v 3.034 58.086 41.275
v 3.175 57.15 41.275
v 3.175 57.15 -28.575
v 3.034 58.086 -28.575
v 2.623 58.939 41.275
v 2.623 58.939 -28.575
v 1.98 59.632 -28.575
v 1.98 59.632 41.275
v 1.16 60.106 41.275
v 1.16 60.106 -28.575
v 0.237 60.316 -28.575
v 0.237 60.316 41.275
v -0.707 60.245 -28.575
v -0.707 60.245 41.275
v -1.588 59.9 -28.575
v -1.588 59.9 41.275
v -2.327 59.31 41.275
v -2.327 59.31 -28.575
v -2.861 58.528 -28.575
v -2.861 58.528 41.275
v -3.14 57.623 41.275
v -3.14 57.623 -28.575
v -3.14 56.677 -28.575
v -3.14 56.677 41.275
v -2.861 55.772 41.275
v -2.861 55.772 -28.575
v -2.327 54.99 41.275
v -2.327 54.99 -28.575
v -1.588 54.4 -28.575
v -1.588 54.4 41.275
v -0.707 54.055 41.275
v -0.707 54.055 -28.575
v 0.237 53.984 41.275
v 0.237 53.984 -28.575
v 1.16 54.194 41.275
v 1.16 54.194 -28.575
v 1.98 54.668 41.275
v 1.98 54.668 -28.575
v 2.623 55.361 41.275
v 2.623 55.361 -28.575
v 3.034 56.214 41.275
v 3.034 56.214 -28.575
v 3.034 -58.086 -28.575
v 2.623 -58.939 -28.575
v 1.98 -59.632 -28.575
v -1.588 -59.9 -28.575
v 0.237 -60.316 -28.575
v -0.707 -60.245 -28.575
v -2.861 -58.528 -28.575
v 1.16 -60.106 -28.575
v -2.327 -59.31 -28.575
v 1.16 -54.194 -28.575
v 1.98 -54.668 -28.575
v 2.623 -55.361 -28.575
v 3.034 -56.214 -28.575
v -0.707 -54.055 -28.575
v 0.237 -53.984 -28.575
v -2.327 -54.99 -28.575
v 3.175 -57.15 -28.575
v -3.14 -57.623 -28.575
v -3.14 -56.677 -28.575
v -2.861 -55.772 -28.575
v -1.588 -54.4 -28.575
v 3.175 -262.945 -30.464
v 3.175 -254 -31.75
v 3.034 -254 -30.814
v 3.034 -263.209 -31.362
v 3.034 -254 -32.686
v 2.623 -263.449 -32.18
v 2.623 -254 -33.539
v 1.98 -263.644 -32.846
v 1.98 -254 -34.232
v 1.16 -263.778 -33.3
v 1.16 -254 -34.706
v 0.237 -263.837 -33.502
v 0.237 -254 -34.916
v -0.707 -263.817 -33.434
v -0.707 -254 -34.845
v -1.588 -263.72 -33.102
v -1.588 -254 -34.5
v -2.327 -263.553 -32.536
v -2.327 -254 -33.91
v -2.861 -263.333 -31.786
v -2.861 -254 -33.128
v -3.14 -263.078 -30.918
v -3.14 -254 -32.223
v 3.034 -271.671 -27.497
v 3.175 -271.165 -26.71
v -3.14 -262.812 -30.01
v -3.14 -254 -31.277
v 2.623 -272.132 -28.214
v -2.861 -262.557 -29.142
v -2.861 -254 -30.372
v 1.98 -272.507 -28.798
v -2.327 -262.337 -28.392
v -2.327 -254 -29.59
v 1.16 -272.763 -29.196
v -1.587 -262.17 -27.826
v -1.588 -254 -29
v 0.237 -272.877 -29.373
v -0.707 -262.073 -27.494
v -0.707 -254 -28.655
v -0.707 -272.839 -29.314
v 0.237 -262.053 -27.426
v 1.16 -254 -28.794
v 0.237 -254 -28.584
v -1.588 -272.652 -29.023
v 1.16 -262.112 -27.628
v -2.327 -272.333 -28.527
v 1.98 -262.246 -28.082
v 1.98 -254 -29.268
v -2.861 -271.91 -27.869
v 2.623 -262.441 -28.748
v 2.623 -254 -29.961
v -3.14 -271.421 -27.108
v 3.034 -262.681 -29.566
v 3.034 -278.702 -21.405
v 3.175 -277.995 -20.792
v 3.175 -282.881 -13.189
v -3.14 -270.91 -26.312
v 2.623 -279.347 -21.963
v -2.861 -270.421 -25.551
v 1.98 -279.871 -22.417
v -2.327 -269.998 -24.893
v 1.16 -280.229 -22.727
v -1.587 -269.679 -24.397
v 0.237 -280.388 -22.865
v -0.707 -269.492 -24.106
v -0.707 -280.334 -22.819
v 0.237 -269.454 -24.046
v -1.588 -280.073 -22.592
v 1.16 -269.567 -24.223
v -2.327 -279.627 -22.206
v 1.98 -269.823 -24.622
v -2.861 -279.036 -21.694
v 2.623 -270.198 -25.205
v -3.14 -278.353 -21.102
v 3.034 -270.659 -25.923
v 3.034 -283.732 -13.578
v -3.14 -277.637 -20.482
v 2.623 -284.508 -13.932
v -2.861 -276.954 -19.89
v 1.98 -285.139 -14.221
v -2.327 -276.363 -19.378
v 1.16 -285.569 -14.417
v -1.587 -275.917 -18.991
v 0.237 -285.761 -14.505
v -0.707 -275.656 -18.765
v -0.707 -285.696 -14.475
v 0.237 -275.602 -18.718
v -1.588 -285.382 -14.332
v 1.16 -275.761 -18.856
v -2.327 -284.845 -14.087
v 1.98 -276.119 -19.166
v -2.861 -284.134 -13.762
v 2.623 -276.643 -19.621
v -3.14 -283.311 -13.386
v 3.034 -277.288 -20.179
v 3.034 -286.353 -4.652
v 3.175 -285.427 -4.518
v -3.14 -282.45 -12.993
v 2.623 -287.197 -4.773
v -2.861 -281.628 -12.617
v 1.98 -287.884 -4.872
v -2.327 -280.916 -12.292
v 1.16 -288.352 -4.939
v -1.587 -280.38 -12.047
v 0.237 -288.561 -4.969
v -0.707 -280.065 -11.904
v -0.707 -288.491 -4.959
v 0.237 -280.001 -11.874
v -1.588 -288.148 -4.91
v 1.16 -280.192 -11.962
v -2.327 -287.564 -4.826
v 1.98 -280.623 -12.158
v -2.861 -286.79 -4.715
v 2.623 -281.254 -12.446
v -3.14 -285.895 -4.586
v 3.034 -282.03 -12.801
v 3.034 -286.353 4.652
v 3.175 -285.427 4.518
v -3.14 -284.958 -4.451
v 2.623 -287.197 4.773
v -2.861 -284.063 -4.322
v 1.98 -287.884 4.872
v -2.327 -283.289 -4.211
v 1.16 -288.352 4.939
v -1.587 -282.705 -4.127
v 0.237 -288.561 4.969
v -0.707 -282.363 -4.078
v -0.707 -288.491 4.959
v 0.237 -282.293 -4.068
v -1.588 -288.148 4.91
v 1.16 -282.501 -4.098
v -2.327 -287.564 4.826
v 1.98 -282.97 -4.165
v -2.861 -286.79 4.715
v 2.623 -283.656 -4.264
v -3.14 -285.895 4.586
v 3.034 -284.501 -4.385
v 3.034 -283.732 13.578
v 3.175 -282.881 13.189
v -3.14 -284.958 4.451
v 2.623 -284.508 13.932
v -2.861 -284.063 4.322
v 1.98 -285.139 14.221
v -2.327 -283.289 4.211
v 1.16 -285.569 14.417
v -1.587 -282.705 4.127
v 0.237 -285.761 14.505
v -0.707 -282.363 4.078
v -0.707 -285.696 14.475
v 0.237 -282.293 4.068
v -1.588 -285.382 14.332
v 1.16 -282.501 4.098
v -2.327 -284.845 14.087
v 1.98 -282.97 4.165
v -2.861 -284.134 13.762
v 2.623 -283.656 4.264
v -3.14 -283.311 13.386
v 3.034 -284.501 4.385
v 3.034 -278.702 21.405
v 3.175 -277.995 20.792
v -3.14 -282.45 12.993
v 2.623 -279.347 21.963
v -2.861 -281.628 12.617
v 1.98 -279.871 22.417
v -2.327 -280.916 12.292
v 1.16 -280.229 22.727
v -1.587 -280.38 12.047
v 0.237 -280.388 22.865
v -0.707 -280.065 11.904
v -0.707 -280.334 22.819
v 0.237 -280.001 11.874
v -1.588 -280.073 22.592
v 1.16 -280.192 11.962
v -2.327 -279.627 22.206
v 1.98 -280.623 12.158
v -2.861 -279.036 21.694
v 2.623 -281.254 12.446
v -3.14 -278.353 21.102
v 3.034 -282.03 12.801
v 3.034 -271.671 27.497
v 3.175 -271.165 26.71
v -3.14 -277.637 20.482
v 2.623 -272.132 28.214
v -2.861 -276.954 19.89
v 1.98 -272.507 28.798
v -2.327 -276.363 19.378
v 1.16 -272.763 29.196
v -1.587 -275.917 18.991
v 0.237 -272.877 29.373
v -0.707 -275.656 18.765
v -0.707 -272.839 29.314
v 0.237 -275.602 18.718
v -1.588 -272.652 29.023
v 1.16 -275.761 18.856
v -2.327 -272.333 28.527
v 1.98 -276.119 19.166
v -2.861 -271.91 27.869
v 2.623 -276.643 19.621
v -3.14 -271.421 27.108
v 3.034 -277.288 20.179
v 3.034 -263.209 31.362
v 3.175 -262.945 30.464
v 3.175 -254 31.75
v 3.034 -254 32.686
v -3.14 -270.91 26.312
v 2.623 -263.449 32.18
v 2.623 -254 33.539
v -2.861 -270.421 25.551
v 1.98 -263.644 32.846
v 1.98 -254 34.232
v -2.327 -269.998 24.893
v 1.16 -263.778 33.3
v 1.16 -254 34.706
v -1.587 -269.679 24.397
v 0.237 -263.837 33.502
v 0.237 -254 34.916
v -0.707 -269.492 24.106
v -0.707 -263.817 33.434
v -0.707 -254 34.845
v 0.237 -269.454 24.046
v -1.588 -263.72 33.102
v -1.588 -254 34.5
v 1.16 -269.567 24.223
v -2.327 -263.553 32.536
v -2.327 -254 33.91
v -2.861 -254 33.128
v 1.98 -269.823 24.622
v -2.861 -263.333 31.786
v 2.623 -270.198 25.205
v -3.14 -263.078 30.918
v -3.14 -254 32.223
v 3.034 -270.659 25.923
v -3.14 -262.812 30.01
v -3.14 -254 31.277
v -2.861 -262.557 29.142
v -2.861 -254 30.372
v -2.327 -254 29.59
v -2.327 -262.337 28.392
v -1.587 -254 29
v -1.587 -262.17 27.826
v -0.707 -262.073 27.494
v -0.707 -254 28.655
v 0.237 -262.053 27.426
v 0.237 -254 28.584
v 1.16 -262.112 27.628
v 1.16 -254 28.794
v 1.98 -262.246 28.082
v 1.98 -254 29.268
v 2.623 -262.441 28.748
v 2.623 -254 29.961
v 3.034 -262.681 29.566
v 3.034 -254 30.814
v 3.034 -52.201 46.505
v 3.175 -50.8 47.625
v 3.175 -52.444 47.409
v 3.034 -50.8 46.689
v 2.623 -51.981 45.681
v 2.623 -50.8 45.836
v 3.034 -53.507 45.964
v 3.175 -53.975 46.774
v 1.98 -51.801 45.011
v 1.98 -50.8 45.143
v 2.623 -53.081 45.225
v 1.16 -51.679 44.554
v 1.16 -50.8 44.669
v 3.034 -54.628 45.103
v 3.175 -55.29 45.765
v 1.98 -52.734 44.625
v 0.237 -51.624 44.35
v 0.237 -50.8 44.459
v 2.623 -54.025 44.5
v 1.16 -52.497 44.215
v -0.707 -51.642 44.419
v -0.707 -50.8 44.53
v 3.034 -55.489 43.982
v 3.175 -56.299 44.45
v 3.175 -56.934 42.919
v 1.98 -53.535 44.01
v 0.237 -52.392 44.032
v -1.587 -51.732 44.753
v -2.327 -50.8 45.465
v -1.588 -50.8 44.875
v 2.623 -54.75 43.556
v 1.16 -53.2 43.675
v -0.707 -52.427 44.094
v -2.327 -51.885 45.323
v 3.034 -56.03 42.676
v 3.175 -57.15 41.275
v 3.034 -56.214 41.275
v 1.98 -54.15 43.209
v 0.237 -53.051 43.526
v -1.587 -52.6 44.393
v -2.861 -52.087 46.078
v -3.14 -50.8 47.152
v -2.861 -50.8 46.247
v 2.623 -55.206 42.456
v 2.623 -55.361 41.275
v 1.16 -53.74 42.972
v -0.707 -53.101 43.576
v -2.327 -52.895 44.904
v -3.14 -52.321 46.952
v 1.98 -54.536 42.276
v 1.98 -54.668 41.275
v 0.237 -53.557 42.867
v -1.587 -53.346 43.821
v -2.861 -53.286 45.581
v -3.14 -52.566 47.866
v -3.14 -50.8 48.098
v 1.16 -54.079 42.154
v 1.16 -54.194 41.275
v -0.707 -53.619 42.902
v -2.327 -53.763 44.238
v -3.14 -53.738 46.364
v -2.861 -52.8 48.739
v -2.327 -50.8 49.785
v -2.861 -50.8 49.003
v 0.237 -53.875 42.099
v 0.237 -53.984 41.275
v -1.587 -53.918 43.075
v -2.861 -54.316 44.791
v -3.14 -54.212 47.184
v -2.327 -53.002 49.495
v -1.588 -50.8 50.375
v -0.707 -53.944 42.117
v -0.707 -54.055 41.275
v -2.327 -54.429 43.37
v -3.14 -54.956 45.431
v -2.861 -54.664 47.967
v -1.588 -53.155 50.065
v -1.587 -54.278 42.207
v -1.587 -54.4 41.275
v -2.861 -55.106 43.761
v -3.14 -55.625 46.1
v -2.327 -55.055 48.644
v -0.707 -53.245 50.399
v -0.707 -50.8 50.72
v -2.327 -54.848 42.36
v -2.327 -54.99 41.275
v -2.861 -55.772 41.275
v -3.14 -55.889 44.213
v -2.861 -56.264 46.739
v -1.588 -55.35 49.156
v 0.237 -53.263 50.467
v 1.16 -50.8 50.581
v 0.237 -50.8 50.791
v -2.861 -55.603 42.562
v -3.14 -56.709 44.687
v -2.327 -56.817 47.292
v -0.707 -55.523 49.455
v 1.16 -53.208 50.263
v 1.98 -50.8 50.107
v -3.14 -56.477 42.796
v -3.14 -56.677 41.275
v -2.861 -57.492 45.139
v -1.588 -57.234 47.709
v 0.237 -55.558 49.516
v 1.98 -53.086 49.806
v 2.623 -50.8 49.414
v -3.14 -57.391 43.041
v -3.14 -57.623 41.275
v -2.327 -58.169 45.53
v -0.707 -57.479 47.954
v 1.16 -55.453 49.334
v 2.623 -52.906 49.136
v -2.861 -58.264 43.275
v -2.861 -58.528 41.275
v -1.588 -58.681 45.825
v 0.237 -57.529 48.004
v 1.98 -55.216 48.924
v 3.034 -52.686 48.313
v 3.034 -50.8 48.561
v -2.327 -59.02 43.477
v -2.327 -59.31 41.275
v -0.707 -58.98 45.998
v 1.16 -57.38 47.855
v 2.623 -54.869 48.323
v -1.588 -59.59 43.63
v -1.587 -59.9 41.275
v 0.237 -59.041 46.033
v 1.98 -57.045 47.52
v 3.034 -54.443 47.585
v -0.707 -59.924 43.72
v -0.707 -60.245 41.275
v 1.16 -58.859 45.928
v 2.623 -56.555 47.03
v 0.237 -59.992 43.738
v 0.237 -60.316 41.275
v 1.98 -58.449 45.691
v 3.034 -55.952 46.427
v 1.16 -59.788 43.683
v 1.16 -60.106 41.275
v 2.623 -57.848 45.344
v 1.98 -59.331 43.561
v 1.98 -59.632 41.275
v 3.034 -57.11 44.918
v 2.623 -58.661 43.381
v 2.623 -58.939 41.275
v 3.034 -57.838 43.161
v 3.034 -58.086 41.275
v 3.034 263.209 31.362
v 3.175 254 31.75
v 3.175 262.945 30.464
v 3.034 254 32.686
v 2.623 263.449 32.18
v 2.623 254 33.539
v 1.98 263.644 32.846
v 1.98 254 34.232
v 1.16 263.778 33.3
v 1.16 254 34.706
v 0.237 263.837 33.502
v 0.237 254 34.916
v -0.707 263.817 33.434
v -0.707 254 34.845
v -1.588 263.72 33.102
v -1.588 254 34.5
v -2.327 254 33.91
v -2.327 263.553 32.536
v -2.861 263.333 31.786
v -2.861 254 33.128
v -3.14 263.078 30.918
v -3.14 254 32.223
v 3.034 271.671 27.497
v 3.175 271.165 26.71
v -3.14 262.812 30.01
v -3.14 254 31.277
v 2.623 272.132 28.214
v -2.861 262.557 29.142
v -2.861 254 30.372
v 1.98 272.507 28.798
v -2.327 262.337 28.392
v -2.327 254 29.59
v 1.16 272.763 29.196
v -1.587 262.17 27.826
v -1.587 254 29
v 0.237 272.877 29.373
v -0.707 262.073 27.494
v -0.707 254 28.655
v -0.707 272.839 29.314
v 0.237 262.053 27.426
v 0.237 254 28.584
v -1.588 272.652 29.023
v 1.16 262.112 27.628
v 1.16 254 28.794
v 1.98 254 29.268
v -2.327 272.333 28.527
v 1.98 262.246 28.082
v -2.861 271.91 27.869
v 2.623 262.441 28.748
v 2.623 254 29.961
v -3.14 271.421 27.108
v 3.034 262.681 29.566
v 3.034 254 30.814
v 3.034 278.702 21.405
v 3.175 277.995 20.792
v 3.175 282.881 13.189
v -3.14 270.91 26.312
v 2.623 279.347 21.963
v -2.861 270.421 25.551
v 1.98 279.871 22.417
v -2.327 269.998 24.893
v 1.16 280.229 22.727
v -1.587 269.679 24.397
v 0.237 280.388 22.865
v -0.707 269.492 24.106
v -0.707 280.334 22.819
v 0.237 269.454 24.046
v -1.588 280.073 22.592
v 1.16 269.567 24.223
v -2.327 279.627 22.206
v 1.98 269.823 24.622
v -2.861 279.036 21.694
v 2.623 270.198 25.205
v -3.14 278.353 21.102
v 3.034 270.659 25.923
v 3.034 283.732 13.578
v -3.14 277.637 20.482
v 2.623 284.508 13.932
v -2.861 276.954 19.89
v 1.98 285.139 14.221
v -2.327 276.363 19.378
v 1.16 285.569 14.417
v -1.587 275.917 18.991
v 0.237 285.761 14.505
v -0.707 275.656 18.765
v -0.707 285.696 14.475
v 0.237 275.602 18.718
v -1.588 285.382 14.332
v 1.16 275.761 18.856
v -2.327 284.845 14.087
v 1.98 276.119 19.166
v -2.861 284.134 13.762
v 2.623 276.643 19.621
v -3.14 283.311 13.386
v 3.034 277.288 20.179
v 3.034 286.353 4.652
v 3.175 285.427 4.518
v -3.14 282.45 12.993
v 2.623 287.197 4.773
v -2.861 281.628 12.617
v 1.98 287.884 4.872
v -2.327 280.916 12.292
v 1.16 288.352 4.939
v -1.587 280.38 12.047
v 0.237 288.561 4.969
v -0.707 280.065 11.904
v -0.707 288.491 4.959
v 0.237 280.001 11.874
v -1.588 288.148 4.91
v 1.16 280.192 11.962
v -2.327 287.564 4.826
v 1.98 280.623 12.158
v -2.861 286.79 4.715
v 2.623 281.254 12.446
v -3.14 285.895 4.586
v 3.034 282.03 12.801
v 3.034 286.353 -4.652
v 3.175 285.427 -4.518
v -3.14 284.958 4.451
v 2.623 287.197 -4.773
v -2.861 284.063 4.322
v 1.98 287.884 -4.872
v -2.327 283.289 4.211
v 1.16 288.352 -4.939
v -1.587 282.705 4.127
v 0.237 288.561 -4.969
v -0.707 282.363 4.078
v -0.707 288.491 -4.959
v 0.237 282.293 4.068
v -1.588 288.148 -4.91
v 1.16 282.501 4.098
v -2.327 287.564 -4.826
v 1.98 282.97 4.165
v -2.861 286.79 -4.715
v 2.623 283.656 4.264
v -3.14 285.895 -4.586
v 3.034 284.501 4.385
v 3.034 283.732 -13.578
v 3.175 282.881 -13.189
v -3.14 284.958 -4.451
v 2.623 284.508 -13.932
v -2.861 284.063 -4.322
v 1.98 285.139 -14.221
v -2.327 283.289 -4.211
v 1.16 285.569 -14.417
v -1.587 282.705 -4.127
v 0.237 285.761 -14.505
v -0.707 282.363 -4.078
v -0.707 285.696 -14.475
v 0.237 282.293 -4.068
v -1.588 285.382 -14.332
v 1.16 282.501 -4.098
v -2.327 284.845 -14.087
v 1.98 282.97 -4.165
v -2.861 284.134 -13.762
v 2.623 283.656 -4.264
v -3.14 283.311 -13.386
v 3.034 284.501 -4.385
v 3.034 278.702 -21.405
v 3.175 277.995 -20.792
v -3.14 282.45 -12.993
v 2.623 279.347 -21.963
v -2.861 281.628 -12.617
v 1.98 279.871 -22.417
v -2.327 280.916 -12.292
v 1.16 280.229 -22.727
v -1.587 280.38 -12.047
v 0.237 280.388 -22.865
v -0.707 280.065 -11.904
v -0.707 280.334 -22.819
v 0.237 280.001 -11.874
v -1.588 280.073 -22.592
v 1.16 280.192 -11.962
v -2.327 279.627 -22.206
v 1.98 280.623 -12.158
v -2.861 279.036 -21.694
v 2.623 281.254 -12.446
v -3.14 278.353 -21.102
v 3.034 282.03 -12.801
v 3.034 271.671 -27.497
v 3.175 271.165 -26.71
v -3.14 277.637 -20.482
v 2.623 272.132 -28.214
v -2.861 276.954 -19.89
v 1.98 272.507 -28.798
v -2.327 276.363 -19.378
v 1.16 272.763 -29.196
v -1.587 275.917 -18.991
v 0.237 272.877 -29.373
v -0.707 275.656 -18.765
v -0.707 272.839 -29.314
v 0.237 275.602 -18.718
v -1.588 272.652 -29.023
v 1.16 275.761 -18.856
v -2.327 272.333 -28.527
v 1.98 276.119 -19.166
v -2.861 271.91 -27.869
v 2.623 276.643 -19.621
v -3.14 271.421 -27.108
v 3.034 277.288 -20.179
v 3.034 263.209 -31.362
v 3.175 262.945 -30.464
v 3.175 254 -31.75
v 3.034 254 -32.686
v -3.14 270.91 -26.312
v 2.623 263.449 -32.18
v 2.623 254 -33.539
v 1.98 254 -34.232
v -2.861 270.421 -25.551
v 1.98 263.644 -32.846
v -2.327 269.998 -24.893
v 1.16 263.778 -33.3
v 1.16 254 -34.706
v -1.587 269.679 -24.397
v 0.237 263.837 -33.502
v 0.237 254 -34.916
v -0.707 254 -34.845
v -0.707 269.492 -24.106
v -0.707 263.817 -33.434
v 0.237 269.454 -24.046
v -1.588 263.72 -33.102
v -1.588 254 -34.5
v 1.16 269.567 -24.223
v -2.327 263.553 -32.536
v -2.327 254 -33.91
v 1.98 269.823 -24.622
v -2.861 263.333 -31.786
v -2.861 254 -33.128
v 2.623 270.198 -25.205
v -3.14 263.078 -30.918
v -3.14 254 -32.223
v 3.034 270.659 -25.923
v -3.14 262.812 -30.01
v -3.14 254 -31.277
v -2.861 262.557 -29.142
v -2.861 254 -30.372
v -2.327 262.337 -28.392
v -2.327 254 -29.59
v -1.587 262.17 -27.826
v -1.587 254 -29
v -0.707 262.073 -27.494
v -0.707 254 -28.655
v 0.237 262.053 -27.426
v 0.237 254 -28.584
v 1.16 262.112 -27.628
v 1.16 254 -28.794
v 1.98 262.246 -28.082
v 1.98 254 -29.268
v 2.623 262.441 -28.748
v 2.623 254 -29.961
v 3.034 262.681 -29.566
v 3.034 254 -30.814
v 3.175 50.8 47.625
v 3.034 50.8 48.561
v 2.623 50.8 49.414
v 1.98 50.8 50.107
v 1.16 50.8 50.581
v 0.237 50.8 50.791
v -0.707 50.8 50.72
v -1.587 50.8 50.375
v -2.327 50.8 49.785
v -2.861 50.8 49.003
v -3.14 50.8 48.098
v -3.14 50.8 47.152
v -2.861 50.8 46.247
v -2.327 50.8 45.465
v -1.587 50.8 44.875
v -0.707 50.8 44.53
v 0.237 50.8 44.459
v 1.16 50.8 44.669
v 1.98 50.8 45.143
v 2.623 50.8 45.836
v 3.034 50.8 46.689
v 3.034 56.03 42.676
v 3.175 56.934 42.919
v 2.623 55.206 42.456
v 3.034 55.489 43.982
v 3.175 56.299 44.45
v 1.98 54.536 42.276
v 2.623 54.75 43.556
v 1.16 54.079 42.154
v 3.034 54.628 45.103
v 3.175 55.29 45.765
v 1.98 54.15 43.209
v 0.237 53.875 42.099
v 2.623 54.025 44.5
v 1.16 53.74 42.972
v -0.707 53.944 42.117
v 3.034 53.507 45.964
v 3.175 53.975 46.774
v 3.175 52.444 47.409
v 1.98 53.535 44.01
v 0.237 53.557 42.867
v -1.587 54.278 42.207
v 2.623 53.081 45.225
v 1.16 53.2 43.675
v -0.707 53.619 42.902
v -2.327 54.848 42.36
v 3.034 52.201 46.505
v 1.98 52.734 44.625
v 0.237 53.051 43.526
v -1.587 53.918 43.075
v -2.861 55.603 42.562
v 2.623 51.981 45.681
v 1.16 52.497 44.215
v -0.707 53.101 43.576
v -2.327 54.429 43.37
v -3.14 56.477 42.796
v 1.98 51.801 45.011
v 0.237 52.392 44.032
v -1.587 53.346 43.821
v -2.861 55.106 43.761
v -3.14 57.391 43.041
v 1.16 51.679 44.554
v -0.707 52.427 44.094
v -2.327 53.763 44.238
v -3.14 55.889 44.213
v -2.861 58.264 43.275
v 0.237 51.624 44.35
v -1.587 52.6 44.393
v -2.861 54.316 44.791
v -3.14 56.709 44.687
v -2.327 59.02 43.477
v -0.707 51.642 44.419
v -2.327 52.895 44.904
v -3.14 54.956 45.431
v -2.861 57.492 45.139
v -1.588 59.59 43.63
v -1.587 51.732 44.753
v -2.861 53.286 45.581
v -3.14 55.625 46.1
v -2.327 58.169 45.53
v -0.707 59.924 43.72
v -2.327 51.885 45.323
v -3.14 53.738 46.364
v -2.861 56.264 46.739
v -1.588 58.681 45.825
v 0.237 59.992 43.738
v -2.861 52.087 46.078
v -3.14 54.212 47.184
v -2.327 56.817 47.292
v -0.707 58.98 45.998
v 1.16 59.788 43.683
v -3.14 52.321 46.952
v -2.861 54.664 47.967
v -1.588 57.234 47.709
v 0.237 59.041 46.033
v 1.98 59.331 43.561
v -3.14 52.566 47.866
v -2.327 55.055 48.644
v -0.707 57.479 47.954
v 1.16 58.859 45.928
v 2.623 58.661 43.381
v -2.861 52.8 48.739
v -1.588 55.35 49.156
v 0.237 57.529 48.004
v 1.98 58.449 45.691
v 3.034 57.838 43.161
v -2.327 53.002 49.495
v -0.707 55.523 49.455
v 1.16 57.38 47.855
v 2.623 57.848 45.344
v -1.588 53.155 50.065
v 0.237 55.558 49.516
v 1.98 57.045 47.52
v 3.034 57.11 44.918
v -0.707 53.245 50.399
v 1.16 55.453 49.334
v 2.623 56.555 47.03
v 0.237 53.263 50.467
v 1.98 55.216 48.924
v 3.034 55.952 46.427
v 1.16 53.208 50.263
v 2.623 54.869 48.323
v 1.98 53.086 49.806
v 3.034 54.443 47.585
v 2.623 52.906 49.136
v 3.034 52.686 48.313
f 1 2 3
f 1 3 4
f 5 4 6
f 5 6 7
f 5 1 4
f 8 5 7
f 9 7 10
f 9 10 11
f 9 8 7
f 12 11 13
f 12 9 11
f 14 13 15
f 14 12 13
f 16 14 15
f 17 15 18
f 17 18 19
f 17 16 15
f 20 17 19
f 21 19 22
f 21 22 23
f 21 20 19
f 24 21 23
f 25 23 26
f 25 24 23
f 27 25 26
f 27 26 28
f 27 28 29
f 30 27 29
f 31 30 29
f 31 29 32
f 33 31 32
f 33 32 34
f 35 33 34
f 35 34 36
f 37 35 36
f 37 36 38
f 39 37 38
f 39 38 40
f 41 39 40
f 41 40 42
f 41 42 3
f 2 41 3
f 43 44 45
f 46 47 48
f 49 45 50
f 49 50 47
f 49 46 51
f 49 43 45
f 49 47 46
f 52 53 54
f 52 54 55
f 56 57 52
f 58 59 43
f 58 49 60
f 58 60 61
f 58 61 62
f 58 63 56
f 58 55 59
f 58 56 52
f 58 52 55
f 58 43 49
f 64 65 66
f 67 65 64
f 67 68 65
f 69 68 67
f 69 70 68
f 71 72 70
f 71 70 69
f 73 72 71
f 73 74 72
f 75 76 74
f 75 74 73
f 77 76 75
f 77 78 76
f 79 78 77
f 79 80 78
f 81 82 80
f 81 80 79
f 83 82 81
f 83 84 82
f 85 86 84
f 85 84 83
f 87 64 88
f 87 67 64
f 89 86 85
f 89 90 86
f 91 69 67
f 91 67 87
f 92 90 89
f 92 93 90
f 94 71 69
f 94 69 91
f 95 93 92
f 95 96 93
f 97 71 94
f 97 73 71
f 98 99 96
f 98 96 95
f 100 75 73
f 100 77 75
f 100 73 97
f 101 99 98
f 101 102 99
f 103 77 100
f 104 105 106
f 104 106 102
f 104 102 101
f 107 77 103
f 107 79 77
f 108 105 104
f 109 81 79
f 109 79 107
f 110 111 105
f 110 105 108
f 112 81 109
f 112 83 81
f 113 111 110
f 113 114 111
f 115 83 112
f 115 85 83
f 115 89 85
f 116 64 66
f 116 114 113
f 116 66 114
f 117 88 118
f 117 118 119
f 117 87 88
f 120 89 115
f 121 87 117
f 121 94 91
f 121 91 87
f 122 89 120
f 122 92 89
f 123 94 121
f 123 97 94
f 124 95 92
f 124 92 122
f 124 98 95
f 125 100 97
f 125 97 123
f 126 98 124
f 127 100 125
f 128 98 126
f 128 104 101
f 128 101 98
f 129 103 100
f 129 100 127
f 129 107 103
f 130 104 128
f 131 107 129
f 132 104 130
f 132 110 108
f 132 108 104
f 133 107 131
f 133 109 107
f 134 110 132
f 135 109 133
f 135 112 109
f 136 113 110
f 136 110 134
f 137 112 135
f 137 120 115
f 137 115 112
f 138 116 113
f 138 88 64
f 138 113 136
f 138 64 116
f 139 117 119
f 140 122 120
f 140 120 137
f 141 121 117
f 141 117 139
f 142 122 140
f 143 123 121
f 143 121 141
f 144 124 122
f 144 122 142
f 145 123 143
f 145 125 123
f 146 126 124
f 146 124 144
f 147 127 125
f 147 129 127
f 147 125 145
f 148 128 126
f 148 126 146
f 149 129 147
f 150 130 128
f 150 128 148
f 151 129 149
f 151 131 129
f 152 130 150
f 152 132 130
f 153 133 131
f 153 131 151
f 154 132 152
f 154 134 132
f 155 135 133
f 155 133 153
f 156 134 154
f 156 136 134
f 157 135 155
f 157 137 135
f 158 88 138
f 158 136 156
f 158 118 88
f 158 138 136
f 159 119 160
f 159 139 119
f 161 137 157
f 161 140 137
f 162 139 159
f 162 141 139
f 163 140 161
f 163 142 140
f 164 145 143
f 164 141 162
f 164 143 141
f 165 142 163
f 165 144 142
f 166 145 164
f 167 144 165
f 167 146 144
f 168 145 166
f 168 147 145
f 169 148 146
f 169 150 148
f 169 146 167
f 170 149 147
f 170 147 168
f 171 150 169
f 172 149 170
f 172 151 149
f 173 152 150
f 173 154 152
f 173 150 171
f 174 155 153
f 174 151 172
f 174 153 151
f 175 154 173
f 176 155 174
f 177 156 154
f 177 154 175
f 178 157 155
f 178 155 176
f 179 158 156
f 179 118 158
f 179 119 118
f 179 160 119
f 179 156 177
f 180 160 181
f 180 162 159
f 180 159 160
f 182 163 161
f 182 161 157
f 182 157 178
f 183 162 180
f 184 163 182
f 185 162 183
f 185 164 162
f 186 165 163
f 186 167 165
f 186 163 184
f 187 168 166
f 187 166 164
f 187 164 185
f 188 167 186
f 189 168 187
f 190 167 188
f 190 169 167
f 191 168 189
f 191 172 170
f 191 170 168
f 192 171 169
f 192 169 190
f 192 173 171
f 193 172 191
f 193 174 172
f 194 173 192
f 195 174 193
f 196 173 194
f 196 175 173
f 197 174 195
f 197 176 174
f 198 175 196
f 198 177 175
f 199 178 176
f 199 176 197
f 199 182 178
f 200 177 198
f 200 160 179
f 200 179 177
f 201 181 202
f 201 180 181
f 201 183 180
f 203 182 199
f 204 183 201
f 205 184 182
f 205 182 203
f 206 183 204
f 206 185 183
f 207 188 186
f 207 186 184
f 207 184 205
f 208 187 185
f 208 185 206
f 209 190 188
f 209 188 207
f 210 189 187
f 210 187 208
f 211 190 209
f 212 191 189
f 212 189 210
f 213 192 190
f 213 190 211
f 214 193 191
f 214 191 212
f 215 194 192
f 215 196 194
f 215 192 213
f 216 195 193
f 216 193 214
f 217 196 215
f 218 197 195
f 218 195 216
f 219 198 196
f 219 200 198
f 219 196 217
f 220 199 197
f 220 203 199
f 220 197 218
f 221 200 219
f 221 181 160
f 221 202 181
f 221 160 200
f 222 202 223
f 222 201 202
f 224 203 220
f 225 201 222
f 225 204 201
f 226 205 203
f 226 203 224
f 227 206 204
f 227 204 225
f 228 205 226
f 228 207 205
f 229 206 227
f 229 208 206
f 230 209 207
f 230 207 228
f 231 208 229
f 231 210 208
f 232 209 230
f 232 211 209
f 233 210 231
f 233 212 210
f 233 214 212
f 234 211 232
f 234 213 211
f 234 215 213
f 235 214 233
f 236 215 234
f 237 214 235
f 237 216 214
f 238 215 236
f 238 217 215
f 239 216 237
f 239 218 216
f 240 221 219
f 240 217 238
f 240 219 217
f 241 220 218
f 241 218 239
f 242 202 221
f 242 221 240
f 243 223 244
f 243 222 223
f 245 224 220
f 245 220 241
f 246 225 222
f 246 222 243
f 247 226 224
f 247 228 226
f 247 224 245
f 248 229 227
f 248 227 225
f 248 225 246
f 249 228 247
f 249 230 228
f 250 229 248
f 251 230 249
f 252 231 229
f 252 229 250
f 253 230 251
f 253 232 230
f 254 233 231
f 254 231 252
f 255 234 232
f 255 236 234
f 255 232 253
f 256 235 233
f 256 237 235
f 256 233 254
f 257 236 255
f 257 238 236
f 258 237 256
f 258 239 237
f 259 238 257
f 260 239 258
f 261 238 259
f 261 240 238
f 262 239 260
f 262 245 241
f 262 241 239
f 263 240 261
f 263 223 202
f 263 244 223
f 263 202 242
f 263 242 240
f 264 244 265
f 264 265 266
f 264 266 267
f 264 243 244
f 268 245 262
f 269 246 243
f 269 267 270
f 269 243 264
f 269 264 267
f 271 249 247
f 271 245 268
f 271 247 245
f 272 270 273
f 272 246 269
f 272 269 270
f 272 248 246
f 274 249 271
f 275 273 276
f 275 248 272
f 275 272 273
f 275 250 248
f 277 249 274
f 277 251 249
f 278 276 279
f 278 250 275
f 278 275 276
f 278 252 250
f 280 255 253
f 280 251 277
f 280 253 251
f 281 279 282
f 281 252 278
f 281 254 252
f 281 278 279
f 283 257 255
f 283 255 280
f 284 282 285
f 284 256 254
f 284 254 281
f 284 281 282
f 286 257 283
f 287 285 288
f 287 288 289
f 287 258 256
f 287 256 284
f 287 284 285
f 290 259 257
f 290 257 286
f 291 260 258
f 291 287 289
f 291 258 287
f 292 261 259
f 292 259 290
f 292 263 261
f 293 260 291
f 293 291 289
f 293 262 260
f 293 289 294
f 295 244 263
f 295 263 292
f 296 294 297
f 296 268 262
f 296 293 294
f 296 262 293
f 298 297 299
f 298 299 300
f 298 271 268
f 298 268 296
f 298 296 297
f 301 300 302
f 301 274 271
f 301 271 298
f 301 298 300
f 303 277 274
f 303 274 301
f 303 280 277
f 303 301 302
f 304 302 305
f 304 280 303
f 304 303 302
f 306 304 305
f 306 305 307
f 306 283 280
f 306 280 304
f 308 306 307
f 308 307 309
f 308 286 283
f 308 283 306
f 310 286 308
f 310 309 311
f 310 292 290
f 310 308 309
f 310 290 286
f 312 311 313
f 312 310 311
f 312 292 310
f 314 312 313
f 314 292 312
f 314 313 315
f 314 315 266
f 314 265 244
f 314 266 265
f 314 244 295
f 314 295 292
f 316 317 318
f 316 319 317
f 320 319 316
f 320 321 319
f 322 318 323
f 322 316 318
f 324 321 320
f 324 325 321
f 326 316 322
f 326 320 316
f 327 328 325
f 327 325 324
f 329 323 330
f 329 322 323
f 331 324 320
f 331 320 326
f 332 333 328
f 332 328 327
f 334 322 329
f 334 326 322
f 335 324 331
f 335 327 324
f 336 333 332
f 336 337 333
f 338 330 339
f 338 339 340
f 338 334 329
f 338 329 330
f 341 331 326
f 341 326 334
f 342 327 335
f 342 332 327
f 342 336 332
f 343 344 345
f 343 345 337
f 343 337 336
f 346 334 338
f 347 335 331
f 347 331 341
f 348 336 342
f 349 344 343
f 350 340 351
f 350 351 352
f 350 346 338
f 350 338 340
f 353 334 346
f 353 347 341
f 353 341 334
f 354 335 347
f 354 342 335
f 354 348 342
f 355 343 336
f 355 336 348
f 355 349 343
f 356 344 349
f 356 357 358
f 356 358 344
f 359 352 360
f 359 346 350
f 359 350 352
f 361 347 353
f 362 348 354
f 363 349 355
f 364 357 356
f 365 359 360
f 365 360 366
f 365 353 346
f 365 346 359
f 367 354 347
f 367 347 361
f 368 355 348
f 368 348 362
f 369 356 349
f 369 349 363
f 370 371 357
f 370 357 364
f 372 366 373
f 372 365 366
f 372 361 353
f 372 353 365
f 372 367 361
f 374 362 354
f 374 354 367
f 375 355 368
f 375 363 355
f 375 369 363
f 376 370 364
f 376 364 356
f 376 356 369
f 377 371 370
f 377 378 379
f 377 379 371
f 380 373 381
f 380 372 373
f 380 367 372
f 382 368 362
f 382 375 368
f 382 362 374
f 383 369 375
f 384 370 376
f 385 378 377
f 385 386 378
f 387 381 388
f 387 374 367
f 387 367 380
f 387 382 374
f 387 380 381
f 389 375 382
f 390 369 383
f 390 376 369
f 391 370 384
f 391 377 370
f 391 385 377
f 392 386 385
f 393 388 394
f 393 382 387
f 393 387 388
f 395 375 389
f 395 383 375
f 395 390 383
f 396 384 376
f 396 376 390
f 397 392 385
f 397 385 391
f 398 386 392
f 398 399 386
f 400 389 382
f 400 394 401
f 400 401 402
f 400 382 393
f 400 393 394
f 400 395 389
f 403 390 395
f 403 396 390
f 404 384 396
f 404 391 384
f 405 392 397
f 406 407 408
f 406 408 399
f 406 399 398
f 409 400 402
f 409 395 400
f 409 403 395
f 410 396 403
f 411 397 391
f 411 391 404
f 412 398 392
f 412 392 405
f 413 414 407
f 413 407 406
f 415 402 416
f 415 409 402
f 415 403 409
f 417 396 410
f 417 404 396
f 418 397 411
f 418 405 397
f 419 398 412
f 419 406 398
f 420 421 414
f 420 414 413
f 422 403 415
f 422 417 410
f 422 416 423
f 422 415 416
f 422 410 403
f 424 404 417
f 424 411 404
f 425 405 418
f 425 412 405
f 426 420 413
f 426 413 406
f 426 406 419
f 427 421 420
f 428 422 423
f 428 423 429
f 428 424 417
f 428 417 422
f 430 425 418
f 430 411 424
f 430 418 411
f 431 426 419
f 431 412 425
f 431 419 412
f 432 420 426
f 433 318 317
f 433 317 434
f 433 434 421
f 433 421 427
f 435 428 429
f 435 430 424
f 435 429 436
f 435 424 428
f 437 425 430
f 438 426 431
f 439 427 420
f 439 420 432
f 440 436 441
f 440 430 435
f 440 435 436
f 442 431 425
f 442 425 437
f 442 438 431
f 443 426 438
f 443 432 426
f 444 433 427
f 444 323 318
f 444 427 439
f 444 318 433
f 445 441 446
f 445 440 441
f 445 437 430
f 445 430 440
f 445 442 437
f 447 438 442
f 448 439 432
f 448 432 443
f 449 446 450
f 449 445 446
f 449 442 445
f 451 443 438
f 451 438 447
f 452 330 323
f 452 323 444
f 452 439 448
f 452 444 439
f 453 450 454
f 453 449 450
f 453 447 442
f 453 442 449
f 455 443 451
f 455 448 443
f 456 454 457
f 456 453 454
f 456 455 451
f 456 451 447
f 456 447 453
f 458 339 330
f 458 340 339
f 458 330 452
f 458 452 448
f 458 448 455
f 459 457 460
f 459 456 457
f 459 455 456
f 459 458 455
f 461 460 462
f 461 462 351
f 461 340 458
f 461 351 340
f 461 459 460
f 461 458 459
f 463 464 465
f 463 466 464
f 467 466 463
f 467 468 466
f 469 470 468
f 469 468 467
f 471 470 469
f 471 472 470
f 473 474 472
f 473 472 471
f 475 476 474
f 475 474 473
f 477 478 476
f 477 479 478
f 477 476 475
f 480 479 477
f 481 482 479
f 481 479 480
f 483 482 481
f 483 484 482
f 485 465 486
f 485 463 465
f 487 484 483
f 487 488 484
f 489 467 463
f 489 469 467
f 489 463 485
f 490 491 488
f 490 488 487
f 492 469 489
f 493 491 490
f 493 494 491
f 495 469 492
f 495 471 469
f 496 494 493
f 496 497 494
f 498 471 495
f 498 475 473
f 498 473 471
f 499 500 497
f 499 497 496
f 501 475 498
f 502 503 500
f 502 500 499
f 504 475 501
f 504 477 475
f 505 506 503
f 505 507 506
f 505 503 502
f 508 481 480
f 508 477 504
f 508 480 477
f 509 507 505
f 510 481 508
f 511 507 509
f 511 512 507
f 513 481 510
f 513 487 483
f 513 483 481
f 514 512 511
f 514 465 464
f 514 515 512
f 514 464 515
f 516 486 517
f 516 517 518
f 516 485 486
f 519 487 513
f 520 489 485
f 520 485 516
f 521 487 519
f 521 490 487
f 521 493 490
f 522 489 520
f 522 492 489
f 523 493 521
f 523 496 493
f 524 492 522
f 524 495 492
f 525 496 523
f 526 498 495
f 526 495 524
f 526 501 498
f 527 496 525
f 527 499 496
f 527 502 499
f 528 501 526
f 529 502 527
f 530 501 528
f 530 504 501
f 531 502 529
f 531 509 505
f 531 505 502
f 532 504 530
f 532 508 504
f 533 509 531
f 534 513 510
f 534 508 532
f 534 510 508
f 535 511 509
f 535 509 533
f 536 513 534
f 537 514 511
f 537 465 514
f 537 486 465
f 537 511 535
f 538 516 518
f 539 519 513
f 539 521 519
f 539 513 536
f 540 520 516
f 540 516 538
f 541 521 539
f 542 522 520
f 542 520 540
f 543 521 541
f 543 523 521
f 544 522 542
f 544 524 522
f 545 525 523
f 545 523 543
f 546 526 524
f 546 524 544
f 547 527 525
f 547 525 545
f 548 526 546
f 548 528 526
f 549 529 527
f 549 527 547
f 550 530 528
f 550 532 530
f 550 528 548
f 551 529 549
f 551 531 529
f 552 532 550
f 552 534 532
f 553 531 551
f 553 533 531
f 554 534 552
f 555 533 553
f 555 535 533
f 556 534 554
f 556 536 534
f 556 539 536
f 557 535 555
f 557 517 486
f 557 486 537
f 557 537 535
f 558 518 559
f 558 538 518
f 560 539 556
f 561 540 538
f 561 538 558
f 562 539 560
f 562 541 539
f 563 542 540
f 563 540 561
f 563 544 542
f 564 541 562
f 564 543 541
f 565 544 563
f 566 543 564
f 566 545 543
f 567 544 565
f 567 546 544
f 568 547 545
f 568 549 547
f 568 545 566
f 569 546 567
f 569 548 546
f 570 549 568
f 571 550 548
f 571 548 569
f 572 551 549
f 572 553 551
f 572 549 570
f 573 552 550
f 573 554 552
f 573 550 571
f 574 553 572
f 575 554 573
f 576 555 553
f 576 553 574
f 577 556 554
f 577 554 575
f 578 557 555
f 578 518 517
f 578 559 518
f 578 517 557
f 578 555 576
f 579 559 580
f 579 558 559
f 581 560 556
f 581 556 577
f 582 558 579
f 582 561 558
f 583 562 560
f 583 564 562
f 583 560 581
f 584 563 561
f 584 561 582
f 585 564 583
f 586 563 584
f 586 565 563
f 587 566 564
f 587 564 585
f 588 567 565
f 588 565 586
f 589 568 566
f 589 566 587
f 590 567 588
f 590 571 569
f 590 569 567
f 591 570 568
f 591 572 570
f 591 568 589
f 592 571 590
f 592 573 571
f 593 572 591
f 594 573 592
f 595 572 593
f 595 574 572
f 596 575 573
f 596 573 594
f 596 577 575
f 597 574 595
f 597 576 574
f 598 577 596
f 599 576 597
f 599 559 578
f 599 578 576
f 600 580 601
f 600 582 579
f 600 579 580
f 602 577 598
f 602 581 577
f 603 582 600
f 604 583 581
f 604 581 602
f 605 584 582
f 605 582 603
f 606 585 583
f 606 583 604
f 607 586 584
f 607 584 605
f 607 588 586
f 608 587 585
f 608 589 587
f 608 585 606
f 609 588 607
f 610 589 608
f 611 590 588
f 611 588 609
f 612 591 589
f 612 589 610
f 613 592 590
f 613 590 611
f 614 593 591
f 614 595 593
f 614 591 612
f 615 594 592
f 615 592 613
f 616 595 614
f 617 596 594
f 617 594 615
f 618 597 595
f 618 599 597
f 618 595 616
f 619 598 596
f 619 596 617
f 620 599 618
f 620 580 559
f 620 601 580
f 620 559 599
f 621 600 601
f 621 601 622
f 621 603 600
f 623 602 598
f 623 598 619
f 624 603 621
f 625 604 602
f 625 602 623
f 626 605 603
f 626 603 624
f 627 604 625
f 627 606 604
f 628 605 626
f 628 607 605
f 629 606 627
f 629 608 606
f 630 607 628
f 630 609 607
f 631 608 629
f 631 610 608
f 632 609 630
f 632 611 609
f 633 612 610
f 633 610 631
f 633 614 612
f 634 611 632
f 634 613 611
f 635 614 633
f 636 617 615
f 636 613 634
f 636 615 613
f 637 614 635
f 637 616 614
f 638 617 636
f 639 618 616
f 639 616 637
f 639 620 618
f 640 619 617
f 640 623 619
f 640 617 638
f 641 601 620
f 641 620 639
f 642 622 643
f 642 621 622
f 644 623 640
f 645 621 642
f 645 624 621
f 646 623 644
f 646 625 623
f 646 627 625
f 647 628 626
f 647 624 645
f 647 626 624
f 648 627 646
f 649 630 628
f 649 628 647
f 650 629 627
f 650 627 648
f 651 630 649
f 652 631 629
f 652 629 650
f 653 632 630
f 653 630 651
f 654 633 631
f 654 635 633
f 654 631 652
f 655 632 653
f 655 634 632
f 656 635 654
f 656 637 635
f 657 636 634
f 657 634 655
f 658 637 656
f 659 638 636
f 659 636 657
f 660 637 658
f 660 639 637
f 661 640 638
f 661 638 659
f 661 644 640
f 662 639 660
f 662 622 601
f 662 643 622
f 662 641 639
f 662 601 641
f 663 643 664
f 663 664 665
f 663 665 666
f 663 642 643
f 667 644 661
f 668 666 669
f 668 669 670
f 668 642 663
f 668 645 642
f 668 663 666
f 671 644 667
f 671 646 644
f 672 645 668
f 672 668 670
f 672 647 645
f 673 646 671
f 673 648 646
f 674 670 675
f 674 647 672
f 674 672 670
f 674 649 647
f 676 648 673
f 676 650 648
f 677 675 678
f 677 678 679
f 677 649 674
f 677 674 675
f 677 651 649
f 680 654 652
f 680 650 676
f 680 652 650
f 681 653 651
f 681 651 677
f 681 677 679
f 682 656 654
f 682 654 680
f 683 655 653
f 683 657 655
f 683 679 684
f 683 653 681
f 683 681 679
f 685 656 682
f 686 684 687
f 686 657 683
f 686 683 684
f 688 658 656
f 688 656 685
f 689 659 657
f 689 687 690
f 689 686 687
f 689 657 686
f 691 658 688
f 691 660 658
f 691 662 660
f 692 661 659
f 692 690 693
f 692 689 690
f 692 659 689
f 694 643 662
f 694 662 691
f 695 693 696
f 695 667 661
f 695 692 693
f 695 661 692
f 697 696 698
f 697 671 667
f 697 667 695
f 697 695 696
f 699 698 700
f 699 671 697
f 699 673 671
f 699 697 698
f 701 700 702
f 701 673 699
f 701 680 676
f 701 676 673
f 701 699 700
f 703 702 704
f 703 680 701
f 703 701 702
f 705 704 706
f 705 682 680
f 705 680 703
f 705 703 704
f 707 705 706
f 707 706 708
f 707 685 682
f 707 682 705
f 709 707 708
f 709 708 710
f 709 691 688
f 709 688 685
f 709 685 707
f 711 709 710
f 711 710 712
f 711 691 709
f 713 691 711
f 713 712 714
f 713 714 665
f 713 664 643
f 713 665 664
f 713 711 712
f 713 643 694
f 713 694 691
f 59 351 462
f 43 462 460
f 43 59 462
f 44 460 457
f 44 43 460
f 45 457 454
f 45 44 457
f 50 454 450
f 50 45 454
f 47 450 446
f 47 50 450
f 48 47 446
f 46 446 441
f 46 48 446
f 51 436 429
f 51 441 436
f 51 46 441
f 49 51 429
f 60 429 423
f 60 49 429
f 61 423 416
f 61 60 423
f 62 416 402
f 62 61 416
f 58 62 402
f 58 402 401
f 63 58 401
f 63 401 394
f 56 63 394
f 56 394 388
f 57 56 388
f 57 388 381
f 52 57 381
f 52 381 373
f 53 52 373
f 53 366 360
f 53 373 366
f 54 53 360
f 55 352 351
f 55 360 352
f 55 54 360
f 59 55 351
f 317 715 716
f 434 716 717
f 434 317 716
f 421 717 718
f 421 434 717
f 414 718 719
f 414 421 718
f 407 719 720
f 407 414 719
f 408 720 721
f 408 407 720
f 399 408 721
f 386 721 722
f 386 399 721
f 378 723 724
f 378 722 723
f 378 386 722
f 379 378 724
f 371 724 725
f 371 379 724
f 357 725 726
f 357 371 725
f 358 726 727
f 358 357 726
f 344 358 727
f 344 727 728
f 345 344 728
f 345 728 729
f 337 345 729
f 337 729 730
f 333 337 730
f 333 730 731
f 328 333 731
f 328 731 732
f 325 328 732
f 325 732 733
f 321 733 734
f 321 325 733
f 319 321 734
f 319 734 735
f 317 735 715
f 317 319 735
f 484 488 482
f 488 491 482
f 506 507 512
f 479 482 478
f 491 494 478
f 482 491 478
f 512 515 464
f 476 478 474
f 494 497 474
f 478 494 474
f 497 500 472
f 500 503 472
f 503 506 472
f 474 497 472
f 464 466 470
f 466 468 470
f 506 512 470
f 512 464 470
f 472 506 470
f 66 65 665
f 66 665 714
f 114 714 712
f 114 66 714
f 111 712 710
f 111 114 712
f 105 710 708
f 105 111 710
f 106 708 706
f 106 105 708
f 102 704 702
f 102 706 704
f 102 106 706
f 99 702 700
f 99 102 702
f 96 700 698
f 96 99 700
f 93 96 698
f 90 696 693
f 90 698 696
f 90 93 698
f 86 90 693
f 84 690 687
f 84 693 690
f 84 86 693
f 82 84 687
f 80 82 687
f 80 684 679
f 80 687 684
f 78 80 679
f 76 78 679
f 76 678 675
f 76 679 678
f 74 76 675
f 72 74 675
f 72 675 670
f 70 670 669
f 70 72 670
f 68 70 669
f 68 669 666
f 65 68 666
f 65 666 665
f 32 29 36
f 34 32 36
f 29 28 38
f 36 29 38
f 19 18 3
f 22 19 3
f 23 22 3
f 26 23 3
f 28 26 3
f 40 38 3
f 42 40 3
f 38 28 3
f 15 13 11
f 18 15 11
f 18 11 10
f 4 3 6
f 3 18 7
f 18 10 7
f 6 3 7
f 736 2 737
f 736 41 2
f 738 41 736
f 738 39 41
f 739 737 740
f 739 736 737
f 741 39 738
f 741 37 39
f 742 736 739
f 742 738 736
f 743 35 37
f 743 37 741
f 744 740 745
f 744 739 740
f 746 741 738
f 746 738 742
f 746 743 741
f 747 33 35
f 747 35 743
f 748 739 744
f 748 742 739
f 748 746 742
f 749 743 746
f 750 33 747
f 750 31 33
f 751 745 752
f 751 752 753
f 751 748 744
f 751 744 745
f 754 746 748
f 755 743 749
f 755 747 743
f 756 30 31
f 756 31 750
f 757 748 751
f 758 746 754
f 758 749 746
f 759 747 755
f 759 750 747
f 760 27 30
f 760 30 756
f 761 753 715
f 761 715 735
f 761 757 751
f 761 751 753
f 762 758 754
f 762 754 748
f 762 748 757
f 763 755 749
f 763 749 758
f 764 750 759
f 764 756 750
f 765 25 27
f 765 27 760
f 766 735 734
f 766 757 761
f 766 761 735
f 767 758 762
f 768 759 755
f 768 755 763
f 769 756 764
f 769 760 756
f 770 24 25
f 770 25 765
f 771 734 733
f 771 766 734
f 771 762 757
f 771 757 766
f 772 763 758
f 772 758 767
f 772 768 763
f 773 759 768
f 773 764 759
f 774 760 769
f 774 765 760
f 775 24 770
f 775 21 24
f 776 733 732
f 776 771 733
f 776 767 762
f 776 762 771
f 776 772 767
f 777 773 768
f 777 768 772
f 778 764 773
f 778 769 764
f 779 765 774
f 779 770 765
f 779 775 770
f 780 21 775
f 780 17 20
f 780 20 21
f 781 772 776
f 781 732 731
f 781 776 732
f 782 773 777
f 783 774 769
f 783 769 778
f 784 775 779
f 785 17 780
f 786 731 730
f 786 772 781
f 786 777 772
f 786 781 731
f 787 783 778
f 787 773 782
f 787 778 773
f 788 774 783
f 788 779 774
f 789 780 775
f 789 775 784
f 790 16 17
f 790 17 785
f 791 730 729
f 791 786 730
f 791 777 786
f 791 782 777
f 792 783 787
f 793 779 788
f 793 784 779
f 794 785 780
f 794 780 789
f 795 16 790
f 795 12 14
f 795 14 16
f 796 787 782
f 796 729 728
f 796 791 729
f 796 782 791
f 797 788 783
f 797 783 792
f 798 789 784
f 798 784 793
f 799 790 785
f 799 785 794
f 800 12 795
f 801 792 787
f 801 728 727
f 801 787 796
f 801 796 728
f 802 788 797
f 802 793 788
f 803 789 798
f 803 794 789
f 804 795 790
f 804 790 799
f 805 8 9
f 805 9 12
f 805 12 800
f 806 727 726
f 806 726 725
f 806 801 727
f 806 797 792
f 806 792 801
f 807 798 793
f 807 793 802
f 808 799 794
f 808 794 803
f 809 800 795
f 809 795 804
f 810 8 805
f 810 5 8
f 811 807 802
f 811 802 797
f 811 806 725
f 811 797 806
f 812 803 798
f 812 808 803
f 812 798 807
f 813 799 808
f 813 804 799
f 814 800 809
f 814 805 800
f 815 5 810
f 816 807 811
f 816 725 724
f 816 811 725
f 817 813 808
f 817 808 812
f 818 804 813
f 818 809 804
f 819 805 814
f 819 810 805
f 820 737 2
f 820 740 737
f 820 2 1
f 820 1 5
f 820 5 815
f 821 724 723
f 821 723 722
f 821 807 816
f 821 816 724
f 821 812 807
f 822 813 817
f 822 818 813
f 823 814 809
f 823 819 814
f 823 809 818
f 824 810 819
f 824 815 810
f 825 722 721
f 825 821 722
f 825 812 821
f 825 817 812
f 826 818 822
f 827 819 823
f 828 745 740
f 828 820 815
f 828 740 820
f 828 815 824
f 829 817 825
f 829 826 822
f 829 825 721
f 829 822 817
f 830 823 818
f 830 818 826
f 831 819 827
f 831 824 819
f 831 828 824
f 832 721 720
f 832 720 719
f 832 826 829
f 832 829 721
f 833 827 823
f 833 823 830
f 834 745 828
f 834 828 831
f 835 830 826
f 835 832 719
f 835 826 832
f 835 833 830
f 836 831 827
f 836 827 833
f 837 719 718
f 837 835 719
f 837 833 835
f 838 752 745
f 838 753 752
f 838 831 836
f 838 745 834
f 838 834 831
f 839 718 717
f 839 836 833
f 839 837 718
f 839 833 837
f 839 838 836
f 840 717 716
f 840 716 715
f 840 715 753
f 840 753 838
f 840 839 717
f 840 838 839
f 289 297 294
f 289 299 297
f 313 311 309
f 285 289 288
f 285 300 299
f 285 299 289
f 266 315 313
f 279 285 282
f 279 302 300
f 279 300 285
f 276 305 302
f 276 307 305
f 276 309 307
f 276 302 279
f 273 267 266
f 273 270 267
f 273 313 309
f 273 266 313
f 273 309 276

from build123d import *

# Parameters (mm, degrees)
SKETCH2_R = 3.175
SKETCH5_R = 3.175


with BuildPart() as part:
    # Sweep1: sweep along a path in Sketch1
    with BuildLine(Plane(origin=(0, 0, 0), x_dir=(0, 0, -1), z_dir=(1, 0, 0))) as sweep1_path:
        ThreePointArc((-31.75, 254), (0, 285.75), (31.75, 254))
        Line((31.75, 254), (31.75, -254))
        ThreePointArc((31.75, -254), (0, -285.75), (-31.75, -254))
    # Sketch2 → Sweep1 (sweep)
    with BuildSketch(Plane(origin=(0, 254, 0), x_dir=(1, 0, 0), z_dir=(0, 1, 0))):
        with Locations((0, -31.75)):
            Circle(SKETCH2_R)
    sweep(path=sweep1_path.line)


with BuildPart() as body_2:
    # Sweep2: sweep along a path in Sketch4
    with BuildLine(Plane(origin=(0, 0, 0), x_dir=(0, 0, -1), z_dir=(1, 0, 0))) as sweep2_path:
        Line((28.575, 57.15), (-41.275, 57.15))
        ThreePointArc((-41.275, 57.15), (-45.765128061, 55.290128061), (-47.625, 50.8))
        Line((-47.625, 50.8), (-47.625, -50.8))
        ThreePointArc((-47.625, -50.8), (-45.765128061, -55.290128061), (-41.275, -57.15))
        Line((-41.275, -57.15), (28.575, -57.15))
    # Sketch5 → Sweep2 (sweep)
    with BuildSketch(Plane.XY.offset(-28.575)):
        with Locations((0, 57.15)):
            Circle(SKETCH5_R)
    sweep(path=sweep2_path.line)


solid = Compound([part.part, body_2.part])
